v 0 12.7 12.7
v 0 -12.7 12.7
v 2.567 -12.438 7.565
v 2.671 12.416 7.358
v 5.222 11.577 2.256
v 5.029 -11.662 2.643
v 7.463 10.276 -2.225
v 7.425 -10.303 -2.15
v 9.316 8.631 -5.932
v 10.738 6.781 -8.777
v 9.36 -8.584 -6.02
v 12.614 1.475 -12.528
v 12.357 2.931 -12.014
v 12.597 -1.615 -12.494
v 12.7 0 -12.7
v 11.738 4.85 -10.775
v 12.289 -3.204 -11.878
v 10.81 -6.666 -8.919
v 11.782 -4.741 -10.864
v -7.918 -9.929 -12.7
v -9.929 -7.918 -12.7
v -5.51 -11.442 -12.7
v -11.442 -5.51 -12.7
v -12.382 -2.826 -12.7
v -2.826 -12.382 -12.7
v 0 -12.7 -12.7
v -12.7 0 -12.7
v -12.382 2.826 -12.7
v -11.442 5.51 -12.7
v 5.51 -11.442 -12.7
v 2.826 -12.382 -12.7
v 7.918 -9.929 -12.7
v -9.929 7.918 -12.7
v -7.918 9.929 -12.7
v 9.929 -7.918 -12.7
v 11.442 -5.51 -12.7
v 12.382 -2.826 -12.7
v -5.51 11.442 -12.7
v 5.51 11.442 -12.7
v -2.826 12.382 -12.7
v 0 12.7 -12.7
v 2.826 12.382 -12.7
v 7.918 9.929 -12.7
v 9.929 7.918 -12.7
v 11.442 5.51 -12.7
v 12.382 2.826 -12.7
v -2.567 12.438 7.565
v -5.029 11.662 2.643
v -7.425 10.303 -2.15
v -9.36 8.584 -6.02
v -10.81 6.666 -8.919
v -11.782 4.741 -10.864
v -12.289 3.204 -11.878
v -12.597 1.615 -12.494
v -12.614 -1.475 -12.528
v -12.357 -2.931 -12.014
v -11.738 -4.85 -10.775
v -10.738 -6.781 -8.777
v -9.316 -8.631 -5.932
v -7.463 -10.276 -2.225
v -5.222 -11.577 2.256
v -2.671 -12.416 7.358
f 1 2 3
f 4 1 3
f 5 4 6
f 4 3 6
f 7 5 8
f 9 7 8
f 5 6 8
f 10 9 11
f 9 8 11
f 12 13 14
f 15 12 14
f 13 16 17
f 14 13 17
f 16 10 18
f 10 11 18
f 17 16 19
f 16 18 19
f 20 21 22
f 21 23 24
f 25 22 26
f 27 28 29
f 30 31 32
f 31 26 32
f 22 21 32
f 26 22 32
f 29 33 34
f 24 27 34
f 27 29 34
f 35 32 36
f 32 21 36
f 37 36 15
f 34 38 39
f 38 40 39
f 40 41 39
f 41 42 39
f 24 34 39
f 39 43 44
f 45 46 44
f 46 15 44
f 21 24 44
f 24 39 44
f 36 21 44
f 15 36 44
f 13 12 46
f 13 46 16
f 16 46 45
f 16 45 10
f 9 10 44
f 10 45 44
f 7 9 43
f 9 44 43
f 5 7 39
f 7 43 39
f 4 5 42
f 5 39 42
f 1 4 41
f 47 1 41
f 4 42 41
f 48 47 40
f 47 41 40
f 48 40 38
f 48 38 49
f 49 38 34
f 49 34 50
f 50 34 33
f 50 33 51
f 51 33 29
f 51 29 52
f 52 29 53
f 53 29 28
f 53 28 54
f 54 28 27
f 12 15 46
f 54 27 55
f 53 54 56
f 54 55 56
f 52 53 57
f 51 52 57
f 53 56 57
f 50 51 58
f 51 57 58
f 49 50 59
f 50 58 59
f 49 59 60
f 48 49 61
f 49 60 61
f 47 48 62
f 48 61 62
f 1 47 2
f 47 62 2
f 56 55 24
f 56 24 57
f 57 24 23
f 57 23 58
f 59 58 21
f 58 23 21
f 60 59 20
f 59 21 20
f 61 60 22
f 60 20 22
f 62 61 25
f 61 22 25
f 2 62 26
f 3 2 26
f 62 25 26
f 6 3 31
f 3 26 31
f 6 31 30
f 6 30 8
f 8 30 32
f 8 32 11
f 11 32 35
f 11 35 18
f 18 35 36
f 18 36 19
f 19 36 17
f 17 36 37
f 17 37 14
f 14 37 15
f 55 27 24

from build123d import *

# Parameters (mm, degrees)
F0_W     = 25.4
F0_H     = 25.4
F1_DEPTH = 12.7
F3_DEPTH = 12.7
F4_R     = 26.692989
F4_R_2   = 12.7
F5_DEPTH = 12.7


with BuildPart() as f1:
    # F0 (on Top) → F1 (new body, symmetric)
    with BuildSketch(Plane.XY):
        Rectangle(F0_W, F0_H)
    extrude(amount=F1_DEPTH, both=True)

    # F2 (on Front) → F3 (cut, symmetric)
    with BuildSketch(Plane.XZ):
        Polygon((-12.7, -12.7), (0, 12.7), (12.7, -12.7), (26.629834, -12.7), (26.629834, 23.978902), (-32.895677, 23.978902), (-32.895677, -12.7), align=None)
    extrude(amount=F3_DEPTH, both=True, mode=Mode.SUBTRACT)

    # F4 (on Top) → F5 (cut, symmetric)
    with BuildSketch(Plane.XY):
        Circle(F4_R)
        Circle(F4_R_2, mode=Mode.SUBTRACT)
    extrude(amount=F5_DEPTH, both=True, mode=Mode.SUBTRACT)


solid = f1.part
